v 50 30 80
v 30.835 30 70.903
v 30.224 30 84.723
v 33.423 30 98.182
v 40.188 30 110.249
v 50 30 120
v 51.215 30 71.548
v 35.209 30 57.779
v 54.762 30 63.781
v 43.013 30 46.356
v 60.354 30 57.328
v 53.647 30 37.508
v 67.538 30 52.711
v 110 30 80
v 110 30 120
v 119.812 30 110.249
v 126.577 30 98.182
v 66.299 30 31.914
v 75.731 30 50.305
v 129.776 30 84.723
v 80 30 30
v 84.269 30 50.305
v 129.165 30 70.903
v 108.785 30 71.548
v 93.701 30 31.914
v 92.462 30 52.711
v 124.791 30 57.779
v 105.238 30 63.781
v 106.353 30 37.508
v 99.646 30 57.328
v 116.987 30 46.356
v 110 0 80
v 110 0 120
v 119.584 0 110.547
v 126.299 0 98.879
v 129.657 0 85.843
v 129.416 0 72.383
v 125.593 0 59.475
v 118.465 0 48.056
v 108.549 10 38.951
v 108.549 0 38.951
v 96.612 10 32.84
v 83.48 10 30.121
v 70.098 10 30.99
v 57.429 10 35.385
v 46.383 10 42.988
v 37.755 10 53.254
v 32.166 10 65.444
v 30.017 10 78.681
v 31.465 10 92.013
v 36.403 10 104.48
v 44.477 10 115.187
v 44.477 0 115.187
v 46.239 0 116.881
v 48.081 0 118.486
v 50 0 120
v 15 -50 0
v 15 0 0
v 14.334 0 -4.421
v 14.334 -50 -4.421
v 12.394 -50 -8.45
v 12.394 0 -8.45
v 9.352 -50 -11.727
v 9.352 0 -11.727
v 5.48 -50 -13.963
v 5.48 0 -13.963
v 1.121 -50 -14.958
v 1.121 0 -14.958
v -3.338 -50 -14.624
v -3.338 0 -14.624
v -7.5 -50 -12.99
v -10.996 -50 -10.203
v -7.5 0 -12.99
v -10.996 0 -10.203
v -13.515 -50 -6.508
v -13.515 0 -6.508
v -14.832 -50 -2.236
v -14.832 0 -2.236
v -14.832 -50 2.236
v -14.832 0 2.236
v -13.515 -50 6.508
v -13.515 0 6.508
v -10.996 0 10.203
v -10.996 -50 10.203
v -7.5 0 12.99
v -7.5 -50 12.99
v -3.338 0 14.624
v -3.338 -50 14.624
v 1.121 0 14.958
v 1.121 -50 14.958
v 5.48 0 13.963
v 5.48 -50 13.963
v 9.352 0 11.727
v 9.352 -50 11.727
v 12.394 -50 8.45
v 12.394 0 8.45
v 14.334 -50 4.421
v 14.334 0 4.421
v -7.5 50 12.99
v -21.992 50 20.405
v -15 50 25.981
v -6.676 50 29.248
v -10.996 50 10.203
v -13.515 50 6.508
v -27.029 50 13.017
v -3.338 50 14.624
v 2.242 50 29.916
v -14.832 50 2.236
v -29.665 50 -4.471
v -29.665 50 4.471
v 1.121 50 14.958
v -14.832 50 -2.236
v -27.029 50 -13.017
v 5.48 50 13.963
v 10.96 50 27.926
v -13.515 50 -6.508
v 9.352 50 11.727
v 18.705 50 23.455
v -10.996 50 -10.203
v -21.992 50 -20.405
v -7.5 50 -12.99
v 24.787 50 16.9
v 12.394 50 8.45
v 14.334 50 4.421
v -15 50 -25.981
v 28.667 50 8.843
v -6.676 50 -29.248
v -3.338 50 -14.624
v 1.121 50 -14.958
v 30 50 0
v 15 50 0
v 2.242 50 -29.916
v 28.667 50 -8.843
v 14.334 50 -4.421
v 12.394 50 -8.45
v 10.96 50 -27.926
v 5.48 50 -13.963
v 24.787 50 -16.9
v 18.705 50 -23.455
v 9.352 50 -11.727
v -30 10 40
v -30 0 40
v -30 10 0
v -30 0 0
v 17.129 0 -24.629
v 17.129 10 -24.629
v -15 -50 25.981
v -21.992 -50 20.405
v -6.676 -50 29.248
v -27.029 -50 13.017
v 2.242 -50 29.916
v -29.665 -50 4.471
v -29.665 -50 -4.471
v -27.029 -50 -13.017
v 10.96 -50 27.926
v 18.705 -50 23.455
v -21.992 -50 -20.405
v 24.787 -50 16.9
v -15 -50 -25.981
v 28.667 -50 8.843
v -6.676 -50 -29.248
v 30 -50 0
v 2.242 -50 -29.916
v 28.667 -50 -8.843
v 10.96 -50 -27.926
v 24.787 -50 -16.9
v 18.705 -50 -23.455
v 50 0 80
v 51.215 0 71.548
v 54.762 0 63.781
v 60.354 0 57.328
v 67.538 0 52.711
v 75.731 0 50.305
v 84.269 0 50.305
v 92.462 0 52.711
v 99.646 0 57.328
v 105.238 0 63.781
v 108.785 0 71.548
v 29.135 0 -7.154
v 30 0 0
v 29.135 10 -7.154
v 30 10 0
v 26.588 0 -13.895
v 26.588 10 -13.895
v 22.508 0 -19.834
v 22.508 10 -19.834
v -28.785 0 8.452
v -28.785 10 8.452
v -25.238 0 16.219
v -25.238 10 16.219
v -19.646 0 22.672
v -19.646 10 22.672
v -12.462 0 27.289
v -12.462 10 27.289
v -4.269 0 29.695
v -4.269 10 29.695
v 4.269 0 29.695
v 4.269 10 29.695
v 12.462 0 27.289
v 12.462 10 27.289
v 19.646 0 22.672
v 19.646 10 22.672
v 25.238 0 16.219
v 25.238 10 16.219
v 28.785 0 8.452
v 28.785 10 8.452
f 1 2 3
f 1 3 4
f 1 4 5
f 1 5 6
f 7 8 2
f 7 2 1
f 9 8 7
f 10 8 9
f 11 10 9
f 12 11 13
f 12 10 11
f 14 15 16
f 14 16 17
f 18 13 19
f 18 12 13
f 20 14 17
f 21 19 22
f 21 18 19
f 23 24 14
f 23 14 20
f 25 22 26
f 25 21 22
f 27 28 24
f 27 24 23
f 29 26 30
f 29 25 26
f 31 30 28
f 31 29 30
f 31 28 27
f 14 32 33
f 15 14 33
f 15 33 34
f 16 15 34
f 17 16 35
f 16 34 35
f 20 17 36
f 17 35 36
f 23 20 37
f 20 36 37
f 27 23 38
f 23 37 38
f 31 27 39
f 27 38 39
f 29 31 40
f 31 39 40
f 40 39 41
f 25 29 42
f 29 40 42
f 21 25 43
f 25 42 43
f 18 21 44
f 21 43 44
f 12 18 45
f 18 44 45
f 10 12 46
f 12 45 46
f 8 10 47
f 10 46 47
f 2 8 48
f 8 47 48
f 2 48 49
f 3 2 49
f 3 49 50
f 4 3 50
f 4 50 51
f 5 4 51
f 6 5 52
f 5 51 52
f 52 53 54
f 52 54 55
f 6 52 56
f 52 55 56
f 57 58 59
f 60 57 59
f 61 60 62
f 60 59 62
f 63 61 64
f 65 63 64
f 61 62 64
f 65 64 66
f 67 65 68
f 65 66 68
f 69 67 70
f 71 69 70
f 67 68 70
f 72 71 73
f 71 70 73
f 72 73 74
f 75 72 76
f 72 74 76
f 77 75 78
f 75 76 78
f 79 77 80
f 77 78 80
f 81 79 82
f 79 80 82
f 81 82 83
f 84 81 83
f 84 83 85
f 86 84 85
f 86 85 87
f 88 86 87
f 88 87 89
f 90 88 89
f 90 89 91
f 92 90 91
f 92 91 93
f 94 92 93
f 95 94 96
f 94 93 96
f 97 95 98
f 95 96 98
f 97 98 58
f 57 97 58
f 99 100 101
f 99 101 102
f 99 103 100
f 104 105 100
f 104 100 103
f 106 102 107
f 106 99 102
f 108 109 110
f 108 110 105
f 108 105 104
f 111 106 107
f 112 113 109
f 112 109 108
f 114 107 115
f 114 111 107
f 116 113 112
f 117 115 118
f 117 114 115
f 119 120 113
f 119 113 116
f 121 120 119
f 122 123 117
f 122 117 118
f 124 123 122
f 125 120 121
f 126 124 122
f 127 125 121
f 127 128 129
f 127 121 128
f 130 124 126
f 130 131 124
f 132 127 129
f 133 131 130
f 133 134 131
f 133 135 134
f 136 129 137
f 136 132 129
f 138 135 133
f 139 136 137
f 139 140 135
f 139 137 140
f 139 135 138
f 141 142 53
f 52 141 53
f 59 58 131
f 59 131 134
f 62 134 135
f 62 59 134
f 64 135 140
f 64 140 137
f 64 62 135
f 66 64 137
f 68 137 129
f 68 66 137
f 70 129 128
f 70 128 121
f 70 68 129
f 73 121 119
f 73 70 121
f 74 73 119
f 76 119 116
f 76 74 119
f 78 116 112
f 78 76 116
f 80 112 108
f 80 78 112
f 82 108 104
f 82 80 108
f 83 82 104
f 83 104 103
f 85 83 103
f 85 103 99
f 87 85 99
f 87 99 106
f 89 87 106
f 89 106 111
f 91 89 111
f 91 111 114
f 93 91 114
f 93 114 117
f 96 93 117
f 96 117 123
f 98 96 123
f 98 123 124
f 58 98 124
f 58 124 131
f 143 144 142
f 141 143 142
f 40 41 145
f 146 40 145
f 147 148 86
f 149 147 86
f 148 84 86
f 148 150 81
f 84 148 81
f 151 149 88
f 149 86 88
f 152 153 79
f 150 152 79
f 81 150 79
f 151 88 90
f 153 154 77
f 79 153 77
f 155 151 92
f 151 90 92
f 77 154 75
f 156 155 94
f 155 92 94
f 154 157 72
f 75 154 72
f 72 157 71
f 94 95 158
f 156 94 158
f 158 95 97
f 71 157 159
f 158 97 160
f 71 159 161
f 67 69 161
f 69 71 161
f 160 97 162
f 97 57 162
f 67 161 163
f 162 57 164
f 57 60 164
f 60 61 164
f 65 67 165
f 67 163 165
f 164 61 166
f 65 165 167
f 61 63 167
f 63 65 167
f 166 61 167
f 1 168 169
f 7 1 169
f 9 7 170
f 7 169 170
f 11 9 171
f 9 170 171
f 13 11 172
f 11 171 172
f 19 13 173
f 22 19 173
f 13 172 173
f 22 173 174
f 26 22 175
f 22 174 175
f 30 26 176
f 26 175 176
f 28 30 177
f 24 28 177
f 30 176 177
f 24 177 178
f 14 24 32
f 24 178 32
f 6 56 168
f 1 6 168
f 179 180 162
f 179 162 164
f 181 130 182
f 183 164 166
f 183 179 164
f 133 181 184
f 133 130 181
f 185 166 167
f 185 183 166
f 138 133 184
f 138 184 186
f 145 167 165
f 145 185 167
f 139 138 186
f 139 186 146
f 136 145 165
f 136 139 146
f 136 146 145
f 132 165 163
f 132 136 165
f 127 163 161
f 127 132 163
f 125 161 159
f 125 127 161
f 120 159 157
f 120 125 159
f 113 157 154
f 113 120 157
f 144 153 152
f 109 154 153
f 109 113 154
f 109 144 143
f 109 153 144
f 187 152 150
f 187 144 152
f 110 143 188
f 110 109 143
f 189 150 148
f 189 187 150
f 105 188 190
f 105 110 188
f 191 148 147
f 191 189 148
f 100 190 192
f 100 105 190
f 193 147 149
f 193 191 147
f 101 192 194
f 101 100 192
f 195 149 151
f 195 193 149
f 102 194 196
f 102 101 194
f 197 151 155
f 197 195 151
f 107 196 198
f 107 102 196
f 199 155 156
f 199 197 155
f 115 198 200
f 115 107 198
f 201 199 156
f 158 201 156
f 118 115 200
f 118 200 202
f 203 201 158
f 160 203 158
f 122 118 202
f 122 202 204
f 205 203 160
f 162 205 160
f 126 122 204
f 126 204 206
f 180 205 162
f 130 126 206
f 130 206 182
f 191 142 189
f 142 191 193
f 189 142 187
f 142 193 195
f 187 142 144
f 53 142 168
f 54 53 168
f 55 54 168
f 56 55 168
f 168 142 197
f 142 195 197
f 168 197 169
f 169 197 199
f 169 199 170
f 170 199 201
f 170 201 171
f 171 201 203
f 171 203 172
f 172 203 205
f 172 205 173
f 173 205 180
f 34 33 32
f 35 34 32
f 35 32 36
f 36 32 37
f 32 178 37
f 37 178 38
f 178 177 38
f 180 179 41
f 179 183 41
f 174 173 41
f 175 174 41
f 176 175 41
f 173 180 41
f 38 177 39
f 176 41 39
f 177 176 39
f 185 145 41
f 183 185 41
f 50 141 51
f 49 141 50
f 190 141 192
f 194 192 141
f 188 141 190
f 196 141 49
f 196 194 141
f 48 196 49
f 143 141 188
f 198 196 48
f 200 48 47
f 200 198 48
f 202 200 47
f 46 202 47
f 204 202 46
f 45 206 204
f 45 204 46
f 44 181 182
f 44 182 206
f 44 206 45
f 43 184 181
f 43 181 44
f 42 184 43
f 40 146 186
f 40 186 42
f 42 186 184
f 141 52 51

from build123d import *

# Parameters (mm, degrees)
SKETCH1_R                = 15
BOSS_EXTRUDE1_DEPTH      = 10
BOSS_EXTRUDE2_DEPTH      = 50
BOSS_EXTRUDE2_DEPTH_BACK = 50
SKETCH1_3_R              = 15
BOSS_EXTRUDE3_DEPTH      = 30


with BuildPart() as part:
    # Sketch1 → Boss-Extrude1 (new body)
    with BuildSketch(Plane(origin=(0, 0, 0), x_dir=(1, 0, 0), z_dir=(0, 1, 0))):
        with BuildLine():
            Line((108.548527268, -38.951472732), (17.129116361, 24.629116361))
            ThreePointArc((17.129116361, 24.629116361), (-13.894720385, 26.588282107), (-30, 0))
            Line((-30, 0), (-30, -40))
            Line((-30, -40), (44.477364607, -115.187247331))
            ThreePointArc((44.477364607, -115.187247331), (47.1504249, -117.694899068), (50, -120))
            Line((50, -120), (50, -80))
            ThreePointArc((50, -80), (80, -50), (110, -80))
            Line((110, -80), (110, -120))
            ThreePointArc((110, -120), (129.991983901, -79.104709192), (108.548527268, -38.951472732))
        make_face()
        Circle(SKETCH1_R, mode=Mode.SUBTRACT)
    extrude(amount=BOSS_EXTRUDE1_DEPTH)

    # Sketch1<3> → Boss-Extrude2 (add, two sides: drawn at the far end of the back side and taken through both)
    with BuildSketch(Plane(origin=(0, 0, 0), x_dir=(1, 0, 0), z_dir=(0, 1, 0)).offset(-BOSS_EXTRUDE2_DEPTH_BACK)):
        with BuildLine():
            ThreePointArc((17.129116361, 24.629116361), (-13.894720385, 26.588282107), (-30, 0))
            ThreePointArc((-30, 0), (0, -30), (30, 0))
            ThreePointArc((30, 0), (26.588282107, 13.894720385), (17.129116361, 24.629116361))
        make_face()
        Circle(SKETCH1_3_R, mode=Mode.SUBTRACT)
    extrude(amount=BOSS_EXTRUDE2_DEPTH + BOSS_EXTRUDE2_DEPTH_BACK)

    # Sketch1<4> → Boss-Extrude3 (add)
    with BuildSketch(Plane(origin=(0, 0, 0), x_dir=(1, 0, 0), z_dir=(0, 1, 0))):
        with BuildLine():
            ThreePointArc((108.548527268, -38.951472732), (41.7229458, -47.830649341), (44.477364607, -115.187247331))
            ThreePointArc((44.477364607, -115.187247331), (47.1504249, -117.694899068), (50, -120))
            Line((50, -120), (50, -80))
            ThreePointArc((50, -80), (80, -50), (110, -80))
            Line((110, -80), (110, -120))
            ThreePointArc((110, -120), (129.991983901, -79.104709192), (108.548527268, -38.951472732))
        make_face()
    extrude(amount=BOSS_EXTRUDE3_DEPTH)


solid = part.part
